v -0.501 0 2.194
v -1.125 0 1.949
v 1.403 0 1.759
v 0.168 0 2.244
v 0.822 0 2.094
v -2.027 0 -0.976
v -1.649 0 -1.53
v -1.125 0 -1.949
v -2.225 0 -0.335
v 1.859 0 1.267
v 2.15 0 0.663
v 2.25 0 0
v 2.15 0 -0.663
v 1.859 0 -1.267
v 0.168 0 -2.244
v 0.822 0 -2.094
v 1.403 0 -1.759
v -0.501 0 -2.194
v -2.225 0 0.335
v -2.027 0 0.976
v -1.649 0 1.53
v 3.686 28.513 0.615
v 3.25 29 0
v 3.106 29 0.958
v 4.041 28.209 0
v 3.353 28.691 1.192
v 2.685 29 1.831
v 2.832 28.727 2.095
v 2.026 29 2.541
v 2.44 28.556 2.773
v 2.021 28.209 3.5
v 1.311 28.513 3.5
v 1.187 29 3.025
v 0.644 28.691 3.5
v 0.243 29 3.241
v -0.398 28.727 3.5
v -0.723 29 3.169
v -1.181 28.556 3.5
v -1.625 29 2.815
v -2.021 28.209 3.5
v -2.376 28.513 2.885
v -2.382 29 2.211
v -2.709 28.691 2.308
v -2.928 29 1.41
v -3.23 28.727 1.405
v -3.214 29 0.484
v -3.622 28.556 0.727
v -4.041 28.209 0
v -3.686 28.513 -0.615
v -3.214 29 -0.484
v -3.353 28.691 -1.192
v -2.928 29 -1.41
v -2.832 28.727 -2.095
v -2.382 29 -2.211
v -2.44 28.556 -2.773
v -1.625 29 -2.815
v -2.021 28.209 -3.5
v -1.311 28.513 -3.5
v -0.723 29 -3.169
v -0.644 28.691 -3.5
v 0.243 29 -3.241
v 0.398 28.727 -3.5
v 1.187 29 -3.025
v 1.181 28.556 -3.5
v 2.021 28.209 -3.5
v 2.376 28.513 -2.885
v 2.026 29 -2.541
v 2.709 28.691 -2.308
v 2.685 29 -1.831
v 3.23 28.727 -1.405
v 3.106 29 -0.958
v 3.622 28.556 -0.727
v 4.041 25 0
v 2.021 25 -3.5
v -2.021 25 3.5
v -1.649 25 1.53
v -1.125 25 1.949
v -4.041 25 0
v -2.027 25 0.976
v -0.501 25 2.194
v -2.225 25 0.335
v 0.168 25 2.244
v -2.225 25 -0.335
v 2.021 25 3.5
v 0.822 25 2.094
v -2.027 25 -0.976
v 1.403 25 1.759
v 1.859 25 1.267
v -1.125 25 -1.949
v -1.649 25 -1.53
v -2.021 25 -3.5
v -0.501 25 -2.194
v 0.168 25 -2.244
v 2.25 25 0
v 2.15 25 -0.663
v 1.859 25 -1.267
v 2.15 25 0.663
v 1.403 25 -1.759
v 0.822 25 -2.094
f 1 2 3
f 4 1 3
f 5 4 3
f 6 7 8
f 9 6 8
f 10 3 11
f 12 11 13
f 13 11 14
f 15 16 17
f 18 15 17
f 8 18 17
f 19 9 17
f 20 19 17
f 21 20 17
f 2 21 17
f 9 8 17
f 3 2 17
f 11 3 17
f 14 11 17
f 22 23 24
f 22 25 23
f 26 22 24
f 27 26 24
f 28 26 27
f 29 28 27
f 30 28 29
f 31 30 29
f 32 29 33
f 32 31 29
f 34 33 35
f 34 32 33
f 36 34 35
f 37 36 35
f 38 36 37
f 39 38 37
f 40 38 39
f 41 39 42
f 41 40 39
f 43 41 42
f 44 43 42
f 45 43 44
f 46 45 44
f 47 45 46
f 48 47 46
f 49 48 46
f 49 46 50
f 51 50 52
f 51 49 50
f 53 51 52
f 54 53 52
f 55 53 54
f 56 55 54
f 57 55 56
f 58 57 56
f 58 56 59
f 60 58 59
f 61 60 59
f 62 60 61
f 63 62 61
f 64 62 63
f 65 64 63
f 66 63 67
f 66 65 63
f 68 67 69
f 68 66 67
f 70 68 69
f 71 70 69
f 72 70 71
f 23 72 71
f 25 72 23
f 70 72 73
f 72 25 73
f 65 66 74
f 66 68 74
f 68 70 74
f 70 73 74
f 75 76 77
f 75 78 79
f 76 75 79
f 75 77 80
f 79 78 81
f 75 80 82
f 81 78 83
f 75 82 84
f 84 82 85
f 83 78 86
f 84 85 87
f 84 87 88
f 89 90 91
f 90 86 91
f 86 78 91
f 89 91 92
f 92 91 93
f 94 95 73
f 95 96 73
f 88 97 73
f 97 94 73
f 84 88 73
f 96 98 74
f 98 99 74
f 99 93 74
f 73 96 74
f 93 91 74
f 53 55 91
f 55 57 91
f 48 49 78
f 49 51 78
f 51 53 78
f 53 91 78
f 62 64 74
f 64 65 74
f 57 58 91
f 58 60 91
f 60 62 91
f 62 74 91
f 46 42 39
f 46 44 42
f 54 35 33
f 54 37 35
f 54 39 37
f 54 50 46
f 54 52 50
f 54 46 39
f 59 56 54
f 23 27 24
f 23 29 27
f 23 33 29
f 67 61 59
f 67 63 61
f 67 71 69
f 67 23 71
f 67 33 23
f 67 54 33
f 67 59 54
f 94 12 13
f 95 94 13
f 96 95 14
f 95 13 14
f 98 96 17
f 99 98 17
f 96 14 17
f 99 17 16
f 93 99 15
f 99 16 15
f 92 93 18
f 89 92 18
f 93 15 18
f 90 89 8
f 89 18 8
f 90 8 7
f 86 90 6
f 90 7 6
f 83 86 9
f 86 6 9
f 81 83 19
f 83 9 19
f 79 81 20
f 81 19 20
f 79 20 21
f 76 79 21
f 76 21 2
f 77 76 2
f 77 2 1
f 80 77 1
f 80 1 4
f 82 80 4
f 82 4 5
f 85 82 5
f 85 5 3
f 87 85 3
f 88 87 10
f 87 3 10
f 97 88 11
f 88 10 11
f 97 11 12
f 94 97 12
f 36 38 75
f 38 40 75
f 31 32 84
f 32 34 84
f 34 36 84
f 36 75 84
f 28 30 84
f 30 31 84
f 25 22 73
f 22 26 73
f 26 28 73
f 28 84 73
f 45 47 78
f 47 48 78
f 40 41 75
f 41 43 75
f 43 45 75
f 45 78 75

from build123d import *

# Parameters (mm, degrees)
SKETCH1_R           = 2.25
BOSS_EXTRUDE1_DEPTH = 25
BOSS_EXTRUDE2_DEPTH = 4
SKETCH3_OUTSIDE_W   = 24.264
SKETCH3_OUTSIDE_H   = 23.182
SKETCH3_OUTSIDE_R   = 3.25
CUT_EXTRUDE1_DEPTH  = 4
CUT_EXTRUDE1_TAPER  = 45


with BuildPart() as part:
    # Sketch1 → Boss-Extrude1 (new body)
    with BuildSketch(Plane(origin=(0, 0, 0), x_dir=(1, 0, 0), z_dir=(0, 1, 0))):
        Circle(SKETCH1_R)
    extrude(amount=BOSS_EXTRUDE1_DEPTH)

    # Sketch2 → Boss-Extrude2 (add)
    with BuildSketch(Plane(origin=(0, 25, 0), x_dir=(1, 0, 0), z_dir=(0, 1, 0))):
        Polygon((4.041451884, 0), (2.020725942, 3.5), (-2.020725942, 3.5), (-4.041451884, 0), (-2.020725942, -3.5), (2.020725942, -3.5), align=None)
    extrude(amount=BOSS_EXTRUDE2_DEPTH)

    # Sketch3 outside → Cut-Extrude1 (cut)
    with BuildSketch(Plane(origin=(0, 29, 0), x_dir=(1, 0, 0), z_dir=(0, 1, 0))):
        Rectangle(SKETCH3_OUTSIDE_W, SKETCH3_OUTSIDE_H)
        Circle(SKETCH3_OUTSIDE_R, mode=Mode.SUBTRACT)
    extrude(amount=-CUT_EXTRUDE1_DEPTH, taper=CUT_EXTRUDE1_TAPER, mode=Mode.SUBTRACT)


solid = part.part
